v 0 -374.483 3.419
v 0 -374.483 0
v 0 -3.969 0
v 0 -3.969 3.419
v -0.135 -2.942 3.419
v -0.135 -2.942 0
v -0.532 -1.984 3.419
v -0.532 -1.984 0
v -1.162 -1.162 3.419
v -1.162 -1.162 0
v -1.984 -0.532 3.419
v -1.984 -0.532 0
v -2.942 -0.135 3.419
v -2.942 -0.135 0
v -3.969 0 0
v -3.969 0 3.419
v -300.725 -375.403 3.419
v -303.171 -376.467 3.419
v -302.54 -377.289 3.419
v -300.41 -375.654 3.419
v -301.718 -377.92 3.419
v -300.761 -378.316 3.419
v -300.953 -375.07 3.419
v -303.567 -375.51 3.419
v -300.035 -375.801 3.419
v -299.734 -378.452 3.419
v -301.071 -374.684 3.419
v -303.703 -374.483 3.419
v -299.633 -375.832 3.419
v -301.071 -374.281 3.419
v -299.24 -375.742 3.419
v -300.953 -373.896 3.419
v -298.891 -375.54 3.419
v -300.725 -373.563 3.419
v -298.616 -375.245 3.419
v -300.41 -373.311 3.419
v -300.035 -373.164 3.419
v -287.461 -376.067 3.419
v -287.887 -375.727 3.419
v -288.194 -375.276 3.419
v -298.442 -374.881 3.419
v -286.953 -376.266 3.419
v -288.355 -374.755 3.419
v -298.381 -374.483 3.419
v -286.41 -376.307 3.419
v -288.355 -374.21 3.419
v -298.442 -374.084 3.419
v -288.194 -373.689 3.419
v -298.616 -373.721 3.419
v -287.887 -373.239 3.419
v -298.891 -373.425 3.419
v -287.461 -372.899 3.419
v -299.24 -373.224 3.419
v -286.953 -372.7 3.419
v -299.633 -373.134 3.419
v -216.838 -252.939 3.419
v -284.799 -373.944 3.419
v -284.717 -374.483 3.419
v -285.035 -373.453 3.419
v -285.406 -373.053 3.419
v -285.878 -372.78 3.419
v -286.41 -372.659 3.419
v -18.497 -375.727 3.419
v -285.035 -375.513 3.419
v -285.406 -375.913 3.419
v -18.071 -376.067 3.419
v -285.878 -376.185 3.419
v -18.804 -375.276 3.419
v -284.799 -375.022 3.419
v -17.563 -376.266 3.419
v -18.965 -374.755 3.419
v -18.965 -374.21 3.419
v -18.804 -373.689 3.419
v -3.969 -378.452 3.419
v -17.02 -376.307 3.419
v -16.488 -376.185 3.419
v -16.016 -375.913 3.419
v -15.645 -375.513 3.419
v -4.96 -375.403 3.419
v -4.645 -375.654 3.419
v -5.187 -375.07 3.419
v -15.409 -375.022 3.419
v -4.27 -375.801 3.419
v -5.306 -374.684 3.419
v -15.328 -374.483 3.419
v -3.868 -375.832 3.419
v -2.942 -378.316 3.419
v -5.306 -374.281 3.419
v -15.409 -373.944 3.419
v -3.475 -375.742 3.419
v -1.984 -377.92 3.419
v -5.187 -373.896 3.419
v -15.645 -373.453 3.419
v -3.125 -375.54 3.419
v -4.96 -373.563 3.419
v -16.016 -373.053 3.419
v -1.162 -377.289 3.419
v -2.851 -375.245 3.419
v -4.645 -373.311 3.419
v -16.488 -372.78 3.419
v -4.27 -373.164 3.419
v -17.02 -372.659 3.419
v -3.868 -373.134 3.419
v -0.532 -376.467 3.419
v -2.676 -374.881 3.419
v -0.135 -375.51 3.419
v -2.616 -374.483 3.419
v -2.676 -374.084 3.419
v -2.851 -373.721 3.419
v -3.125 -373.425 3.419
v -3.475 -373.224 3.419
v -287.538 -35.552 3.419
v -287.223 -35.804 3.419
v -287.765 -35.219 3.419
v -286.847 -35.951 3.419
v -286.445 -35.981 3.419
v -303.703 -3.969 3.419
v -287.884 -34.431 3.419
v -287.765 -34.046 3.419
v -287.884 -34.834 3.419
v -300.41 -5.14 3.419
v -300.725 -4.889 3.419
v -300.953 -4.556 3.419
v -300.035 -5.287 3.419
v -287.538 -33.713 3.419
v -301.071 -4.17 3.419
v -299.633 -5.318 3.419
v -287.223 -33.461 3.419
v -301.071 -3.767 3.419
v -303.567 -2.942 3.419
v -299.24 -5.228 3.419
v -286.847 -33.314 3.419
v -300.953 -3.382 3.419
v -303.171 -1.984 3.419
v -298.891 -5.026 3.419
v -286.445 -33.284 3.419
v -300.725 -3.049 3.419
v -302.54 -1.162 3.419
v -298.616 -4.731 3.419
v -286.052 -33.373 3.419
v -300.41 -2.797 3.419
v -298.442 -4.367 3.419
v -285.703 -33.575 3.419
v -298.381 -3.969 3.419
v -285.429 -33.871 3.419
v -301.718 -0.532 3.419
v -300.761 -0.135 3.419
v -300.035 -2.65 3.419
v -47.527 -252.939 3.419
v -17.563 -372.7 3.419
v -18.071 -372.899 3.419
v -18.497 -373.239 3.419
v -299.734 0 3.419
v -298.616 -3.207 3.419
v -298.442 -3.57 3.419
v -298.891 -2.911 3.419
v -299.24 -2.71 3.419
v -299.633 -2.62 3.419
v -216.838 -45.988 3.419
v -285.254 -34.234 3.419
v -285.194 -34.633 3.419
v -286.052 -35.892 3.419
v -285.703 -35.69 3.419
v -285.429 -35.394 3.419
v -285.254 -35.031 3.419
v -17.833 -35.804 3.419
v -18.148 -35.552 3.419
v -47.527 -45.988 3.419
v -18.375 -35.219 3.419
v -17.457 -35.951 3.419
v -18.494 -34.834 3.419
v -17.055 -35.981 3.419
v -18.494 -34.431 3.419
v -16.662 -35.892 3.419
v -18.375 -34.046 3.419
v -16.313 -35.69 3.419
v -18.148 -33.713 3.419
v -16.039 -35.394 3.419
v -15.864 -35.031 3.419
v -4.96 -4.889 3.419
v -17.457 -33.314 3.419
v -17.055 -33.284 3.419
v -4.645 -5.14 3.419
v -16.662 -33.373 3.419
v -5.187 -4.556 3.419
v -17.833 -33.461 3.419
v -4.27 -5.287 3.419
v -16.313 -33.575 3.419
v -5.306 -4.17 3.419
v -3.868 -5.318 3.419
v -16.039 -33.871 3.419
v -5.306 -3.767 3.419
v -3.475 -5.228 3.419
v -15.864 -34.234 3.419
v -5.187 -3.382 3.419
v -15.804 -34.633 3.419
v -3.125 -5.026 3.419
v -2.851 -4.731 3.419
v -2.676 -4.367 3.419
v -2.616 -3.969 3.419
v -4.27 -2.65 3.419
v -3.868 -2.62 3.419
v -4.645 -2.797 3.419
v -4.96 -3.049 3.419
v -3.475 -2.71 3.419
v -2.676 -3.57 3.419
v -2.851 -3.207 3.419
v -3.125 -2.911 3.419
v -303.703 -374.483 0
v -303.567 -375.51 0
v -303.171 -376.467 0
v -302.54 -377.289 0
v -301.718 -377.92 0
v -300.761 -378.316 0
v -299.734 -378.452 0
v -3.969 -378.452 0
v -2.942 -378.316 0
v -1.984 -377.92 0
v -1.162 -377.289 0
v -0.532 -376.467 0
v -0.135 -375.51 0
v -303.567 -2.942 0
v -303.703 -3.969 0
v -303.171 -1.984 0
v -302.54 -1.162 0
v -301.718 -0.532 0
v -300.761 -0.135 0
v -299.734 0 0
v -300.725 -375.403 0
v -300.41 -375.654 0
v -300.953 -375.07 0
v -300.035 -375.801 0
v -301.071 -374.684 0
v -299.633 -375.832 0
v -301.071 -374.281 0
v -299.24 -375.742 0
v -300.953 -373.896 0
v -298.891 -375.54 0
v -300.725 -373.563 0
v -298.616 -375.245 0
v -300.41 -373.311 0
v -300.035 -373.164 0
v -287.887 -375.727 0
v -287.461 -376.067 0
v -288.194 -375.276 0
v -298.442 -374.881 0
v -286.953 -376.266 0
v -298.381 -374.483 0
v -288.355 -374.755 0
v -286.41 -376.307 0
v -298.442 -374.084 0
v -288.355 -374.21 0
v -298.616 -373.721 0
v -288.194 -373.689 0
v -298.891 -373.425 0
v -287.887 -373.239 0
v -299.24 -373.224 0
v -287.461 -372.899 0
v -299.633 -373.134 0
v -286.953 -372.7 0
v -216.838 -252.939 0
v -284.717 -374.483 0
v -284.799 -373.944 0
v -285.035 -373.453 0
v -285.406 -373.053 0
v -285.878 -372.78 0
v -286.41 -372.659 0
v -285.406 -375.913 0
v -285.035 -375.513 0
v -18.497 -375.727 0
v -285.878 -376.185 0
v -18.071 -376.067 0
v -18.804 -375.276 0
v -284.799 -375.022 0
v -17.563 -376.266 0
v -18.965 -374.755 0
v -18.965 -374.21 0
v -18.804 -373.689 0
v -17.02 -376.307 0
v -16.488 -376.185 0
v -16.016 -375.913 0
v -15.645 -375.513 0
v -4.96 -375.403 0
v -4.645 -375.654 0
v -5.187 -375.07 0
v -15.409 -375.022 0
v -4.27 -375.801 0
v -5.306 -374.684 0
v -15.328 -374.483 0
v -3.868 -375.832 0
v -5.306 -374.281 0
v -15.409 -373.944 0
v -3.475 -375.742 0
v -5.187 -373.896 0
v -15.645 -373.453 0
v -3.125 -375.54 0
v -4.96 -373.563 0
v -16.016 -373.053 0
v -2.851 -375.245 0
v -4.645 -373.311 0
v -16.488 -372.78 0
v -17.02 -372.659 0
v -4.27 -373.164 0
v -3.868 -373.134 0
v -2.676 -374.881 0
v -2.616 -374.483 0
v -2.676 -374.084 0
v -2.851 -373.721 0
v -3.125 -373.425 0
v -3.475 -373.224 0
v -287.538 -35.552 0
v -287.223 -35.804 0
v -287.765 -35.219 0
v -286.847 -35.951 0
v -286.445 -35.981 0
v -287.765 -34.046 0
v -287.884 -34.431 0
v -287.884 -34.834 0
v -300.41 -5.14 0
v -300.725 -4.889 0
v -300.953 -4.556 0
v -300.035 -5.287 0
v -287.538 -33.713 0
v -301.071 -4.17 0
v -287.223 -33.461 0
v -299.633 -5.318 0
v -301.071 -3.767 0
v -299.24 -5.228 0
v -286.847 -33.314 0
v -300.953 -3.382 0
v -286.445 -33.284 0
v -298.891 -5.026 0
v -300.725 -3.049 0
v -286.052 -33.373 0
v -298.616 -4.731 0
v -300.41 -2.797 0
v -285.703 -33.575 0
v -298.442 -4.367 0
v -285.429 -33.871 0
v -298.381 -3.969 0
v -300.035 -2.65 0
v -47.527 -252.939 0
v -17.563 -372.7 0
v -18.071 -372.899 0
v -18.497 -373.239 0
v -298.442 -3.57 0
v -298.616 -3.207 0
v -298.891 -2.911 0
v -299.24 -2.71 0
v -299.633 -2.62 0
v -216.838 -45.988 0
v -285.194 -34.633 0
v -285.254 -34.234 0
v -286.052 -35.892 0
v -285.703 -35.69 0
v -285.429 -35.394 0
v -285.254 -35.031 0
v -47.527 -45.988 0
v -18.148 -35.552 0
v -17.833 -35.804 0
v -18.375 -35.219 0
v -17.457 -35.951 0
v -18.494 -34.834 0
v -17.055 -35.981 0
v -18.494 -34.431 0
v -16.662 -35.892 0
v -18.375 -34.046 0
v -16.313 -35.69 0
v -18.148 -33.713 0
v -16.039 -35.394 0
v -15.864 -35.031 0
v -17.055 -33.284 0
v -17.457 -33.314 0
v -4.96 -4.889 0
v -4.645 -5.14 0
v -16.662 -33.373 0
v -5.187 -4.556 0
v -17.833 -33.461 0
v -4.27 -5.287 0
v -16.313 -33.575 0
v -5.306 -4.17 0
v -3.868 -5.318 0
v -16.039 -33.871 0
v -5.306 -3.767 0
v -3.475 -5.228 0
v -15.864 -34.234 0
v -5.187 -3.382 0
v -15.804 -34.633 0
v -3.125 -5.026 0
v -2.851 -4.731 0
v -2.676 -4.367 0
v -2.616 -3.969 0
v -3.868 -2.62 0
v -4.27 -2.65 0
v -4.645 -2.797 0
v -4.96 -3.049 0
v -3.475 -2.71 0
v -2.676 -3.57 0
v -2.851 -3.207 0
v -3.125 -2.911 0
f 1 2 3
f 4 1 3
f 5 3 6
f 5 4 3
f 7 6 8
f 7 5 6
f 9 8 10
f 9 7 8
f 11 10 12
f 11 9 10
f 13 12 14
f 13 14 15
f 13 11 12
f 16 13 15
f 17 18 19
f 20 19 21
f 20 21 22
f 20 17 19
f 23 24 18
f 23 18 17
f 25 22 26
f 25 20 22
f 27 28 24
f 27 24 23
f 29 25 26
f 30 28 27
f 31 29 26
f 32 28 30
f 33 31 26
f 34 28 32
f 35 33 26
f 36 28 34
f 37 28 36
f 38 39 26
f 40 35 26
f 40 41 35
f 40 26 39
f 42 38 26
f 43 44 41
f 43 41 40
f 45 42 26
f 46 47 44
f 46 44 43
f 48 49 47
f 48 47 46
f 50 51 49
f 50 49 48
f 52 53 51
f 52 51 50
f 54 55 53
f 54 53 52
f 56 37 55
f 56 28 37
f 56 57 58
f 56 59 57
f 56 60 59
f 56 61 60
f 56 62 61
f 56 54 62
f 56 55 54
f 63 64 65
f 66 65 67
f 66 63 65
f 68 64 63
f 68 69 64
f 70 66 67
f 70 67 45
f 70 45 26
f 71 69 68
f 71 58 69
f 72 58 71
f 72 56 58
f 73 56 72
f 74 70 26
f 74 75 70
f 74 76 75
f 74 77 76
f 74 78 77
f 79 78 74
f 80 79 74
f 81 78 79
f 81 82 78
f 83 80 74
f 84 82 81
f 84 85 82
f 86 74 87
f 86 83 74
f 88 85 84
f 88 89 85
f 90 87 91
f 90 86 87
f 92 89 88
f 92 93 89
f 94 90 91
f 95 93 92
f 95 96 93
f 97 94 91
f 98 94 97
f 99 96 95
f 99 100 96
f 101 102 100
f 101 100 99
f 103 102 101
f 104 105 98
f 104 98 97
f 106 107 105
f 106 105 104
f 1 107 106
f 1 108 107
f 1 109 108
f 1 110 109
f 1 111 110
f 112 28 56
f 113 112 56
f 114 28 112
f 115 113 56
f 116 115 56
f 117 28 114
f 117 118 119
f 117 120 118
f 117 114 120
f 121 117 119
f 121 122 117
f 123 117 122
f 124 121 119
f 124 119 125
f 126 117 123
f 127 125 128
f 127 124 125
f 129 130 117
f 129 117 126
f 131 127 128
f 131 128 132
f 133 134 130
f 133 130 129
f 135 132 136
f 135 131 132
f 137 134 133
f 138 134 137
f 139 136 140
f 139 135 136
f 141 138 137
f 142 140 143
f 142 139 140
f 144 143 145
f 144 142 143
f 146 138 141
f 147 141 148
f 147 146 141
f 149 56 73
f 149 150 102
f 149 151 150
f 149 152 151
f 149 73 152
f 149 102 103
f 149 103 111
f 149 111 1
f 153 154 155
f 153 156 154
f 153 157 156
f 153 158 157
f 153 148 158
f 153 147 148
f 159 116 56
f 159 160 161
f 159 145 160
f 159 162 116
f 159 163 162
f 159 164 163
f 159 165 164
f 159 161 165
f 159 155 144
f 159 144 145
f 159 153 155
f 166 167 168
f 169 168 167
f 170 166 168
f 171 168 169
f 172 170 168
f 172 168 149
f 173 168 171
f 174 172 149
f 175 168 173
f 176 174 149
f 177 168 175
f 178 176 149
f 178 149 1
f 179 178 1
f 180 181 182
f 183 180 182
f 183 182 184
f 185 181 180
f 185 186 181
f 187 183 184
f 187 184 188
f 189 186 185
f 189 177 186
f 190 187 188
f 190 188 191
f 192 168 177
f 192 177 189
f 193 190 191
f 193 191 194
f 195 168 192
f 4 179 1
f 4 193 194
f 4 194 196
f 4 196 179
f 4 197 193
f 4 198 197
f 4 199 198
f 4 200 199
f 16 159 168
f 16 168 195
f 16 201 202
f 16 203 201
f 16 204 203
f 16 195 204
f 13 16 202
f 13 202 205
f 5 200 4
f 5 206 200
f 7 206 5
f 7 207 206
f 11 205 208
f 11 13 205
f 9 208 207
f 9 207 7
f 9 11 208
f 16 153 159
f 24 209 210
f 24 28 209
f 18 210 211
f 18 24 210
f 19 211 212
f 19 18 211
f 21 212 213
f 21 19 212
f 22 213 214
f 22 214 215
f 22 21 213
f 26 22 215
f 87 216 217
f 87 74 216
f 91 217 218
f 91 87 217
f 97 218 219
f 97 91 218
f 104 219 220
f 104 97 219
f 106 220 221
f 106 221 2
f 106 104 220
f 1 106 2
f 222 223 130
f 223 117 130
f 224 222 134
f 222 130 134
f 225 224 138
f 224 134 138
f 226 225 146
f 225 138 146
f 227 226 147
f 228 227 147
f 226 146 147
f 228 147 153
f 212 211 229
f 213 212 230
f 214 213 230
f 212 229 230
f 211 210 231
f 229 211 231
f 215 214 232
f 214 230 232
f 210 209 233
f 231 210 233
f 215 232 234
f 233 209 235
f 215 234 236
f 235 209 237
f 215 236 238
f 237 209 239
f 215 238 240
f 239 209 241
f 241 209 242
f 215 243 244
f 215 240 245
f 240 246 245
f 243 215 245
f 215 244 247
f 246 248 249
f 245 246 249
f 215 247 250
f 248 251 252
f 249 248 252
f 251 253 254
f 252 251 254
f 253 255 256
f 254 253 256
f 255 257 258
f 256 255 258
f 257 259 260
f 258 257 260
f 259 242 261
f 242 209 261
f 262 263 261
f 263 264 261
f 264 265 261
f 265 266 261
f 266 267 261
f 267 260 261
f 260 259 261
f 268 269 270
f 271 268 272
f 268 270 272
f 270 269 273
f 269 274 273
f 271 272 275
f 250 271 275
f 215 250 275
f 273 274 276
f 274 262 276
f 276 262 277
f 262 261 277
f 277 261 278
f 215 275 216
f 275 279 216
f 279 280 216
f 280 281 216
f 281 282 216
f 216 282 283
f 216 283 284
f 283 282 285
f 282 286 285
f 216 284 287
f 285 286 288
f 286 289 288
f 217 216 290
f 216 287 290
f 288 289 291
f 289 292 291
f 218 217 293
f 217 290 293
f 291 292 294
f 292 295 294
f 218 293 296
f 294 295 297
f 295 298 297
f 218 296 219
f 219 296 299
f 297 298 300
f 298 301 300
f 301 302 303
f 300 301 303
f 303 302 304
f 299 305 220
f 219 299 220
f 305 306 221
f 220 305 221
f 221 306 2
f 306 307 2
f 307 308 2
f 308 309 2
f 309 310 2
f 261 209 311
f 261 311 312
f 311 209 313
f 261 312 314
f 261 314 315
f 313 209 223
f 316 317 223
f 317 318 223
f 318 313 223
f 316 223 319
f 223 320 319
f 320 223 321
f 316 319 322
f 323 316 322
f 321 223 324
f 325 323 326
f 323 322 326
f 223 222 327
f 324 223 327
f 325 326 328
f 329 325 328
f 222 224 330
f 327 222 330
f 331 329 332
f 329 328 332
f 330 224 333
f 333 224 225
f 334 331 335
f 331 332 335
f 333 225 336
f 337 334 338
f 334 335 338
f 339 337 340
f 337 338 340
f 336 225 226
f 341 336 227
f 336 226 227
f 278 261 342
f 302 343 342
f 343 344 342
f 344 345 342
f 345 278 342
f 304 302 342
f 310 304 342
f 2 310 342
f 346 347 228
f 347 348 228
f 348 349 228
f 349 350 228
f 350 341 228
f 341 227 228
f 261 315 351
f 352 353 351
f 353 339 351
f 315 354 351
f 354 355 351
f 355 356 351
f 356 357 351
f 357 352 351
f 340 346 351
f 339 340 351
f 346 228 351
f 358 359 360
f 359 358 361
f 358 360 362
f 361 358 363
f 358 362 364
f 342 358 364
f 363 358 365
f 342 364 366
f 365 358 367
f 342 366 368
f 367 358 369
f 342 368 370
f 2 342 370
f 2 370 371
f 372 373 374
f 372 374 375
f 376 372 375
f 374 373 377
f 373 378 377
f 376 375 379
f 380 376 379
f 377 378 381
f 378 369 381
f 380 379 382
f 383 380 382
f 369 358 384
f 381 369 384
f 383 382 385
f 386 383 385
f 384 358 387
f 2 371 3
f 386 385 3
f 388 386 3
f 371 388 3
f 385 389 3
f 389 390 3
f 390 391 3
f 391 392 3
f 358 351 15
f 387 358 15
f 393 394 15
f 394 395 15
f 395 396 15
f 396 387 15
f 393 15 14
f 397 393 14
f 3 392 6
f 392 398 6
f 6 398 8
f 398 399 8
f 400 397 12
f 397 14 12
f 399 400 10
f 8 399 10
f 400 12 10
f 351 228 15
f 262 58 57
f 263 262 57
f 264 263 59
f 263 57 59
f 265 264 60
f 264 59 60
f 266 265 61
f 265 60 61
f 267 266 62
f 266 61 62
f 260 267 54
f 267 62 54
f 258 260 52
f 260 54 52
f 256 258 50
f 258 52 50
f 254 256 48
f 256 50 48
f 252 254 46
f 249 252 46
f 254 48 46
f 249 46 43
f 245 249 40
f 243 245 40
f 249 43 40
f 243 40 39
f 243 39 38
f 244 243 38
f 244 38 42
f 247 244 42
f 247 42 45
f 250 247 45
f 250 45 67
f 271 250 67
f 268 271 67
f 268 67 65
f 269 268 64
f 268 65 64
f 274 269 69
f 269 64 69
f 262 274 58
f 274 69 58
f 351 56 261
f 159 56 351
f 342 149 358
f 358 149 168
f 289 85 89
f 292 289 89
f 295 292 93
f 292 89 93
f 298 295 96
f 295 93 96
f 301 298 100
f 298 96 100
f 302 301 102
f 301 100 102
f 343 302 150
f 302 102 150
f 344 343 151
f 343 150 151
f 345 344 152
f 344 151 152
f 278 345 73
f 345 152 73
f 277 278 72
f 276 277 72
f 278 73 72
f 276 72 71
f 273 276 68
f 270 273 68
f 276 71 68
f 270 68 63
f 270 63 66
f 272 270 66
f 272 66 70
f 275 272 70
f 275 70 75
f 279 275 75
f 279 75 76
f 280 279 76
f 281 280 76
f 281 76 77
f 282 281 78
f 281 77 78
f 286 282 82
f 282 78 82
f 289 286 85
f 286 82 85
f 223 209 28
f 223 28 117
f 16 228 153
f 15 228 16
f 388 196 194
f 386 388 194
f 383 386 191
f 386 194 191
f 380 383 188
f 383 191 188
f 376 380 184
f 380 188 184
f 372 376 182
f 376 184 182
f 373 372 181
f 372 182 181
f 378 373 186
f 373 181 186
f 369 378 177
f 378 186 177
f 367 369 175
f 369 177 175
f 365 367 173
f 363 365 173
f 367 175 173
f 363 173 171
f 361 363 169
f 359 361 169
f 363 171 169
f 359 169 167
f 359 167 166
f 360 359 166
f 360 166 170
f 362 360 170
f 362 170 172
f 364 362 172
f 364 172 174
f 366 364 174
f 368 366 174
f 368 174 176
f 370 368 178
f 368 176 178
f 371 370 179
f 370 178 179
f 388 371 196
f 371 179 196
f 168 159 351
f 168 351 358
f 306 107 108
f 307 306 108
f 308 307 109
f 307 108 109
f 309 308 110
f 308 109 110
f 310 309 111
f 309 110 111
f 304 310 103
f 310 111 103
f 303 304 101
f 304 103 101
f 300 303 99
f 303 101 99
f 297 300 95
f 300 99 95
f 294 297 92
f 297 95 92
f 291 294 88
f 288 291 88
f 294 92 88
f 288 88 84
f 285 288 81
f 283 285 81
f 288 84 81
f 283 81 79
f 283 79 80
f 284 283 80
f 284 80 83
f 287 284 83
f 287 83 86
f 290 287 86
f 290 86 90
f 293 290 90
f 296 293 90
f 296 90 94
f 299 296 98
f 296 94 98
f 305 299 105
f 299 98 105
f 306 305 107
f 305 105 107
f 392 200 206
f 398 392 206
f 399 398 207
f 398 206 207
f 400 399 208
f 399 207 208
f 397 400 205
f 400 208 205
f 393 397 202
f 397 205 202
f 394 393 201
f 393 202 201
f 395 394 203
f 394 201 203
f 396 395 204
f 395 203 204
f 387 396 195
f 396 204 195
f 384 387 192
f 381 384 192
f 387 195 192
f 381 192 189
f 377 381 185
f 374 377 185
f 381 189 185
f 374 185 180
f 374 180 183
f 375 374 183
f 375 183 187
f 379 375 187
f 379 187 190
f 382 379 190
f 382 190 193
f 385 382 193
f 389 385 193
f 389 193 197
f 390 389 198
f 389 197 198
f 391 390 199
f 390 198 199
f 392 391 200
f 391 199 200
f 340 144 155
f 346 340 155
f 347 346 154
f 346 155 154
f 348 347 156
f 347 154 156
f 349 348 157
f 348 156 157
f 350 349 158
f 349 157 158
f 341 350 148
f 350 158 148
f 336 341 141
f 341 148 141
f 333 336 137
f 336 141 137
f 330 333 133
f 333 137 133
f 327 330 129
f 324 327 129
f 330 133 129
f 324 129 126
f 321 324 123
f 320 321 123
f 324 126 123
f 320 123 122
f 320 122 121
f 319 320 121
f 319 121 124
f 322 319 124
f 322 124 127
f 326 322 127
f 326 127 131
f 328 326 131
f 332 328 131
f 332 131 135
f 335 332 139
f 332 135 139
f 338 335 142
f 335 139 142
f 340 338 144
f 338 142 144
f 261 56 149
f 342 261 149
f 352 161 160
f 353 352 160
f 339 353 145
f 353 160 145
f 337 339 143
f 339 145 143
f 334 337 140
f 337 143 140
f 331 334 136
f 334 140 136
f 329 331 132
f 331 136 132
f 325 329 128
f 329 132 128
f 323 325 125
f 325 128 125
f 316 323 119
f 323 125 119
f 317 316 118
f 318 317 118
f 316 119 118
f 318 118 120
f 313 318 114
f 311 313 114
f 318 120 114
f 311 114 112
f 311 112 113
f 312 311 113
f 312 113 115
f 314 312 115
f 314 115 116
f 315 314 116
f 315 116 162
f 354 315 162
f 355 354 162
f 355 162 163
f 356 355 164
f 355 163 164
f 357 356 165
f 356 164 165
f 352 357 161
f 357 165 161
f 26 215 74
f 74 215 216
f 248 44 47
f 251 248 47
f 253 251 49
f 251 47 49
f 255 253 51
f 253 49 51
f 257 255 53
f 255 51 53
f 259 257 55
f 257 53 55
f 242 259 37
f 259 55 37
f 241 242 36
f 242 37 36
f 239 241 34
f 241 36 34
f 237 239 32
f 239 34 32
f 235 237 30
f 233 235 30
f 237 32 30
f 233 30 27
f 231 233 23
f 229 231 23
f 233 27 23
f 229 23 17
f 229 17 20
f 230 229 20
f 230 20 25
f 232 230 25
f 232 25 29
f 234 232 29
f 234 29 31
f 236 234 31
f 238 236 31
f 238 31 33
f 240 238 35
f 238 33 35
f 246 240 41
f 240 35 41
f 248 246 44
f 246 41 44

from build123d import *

# Parameters (mm, degrees)
F0_W     = 303.70272
F0_H     = 378.451567
F1_DEPTH = 3.41884
F2_R     = 3.96875
F3_R     = 1.35255
F3_W     = 169.31132
F3_H     = 206.951268
F4_DEPTH = 3.41884
F5_R     = 1.8288
F6_DEPTH = 3.41884


with BuildPart() as f1:
    # F0 (on Top) → F1 (new body)
    with BuildSketch(Plane.XY):
        with Locations((-151.85136, -189.225783)):
            Rectangle(F0_W, F0_H)
    extrude(amount=F1_DEPTH)

    # F2
    f2_edges = [f1.edges().sort_by_distance(p)[0] for p in [
        (-303.70272, 0, 1.70942),
        (-303.70272, -378.451567, 1.70942),
        (0, -378.451567, 1.70942),
        (0, 0, 1.70942),
    ]]
    fillet(f2_edges, radius=F2_R)

    # F3 (on face) → F4 (cut, through all)
    with BuildSketch(Plane.XY.offset(3.41884)):
        with Locations((-299.73397, -3.96875)):
            Circle(F3_R)
        with Locations((-3.96875, -3.96875)):
            Circle(F3_R)
        with Locations((-299.73397, -374.482817)):
            Circle(F3_R)
        with Locations((-3.96875, -374.482817)):
            Circle(F3_R)
        with Locations((-286.54629, -34.632519)):
            Circle(F3_R)
        with Locations((-17.15643, -34.632519)):
            Circle(F3_R)
        with Locations((-132.182794, -149.463223)):
            Rectangle(F3_W, F3_H)
    extrude(amount=-F4_DEPTH, mode=Mode.SUBTRACT)

    # F5 (on face) → F6 (cut, through all)
    with BuildSketch(Plane.XY.offset(3.41884)):
        with Locations((-286.54629, -374.482817)):
            Circle(F5_R)
        with Locations((-17.15643, -374.482817)):
            Circle(F5_R)
    extrude(amount=-F6_DEPTH, mode=Mode.SUBTRACT)


solid = f1.part
